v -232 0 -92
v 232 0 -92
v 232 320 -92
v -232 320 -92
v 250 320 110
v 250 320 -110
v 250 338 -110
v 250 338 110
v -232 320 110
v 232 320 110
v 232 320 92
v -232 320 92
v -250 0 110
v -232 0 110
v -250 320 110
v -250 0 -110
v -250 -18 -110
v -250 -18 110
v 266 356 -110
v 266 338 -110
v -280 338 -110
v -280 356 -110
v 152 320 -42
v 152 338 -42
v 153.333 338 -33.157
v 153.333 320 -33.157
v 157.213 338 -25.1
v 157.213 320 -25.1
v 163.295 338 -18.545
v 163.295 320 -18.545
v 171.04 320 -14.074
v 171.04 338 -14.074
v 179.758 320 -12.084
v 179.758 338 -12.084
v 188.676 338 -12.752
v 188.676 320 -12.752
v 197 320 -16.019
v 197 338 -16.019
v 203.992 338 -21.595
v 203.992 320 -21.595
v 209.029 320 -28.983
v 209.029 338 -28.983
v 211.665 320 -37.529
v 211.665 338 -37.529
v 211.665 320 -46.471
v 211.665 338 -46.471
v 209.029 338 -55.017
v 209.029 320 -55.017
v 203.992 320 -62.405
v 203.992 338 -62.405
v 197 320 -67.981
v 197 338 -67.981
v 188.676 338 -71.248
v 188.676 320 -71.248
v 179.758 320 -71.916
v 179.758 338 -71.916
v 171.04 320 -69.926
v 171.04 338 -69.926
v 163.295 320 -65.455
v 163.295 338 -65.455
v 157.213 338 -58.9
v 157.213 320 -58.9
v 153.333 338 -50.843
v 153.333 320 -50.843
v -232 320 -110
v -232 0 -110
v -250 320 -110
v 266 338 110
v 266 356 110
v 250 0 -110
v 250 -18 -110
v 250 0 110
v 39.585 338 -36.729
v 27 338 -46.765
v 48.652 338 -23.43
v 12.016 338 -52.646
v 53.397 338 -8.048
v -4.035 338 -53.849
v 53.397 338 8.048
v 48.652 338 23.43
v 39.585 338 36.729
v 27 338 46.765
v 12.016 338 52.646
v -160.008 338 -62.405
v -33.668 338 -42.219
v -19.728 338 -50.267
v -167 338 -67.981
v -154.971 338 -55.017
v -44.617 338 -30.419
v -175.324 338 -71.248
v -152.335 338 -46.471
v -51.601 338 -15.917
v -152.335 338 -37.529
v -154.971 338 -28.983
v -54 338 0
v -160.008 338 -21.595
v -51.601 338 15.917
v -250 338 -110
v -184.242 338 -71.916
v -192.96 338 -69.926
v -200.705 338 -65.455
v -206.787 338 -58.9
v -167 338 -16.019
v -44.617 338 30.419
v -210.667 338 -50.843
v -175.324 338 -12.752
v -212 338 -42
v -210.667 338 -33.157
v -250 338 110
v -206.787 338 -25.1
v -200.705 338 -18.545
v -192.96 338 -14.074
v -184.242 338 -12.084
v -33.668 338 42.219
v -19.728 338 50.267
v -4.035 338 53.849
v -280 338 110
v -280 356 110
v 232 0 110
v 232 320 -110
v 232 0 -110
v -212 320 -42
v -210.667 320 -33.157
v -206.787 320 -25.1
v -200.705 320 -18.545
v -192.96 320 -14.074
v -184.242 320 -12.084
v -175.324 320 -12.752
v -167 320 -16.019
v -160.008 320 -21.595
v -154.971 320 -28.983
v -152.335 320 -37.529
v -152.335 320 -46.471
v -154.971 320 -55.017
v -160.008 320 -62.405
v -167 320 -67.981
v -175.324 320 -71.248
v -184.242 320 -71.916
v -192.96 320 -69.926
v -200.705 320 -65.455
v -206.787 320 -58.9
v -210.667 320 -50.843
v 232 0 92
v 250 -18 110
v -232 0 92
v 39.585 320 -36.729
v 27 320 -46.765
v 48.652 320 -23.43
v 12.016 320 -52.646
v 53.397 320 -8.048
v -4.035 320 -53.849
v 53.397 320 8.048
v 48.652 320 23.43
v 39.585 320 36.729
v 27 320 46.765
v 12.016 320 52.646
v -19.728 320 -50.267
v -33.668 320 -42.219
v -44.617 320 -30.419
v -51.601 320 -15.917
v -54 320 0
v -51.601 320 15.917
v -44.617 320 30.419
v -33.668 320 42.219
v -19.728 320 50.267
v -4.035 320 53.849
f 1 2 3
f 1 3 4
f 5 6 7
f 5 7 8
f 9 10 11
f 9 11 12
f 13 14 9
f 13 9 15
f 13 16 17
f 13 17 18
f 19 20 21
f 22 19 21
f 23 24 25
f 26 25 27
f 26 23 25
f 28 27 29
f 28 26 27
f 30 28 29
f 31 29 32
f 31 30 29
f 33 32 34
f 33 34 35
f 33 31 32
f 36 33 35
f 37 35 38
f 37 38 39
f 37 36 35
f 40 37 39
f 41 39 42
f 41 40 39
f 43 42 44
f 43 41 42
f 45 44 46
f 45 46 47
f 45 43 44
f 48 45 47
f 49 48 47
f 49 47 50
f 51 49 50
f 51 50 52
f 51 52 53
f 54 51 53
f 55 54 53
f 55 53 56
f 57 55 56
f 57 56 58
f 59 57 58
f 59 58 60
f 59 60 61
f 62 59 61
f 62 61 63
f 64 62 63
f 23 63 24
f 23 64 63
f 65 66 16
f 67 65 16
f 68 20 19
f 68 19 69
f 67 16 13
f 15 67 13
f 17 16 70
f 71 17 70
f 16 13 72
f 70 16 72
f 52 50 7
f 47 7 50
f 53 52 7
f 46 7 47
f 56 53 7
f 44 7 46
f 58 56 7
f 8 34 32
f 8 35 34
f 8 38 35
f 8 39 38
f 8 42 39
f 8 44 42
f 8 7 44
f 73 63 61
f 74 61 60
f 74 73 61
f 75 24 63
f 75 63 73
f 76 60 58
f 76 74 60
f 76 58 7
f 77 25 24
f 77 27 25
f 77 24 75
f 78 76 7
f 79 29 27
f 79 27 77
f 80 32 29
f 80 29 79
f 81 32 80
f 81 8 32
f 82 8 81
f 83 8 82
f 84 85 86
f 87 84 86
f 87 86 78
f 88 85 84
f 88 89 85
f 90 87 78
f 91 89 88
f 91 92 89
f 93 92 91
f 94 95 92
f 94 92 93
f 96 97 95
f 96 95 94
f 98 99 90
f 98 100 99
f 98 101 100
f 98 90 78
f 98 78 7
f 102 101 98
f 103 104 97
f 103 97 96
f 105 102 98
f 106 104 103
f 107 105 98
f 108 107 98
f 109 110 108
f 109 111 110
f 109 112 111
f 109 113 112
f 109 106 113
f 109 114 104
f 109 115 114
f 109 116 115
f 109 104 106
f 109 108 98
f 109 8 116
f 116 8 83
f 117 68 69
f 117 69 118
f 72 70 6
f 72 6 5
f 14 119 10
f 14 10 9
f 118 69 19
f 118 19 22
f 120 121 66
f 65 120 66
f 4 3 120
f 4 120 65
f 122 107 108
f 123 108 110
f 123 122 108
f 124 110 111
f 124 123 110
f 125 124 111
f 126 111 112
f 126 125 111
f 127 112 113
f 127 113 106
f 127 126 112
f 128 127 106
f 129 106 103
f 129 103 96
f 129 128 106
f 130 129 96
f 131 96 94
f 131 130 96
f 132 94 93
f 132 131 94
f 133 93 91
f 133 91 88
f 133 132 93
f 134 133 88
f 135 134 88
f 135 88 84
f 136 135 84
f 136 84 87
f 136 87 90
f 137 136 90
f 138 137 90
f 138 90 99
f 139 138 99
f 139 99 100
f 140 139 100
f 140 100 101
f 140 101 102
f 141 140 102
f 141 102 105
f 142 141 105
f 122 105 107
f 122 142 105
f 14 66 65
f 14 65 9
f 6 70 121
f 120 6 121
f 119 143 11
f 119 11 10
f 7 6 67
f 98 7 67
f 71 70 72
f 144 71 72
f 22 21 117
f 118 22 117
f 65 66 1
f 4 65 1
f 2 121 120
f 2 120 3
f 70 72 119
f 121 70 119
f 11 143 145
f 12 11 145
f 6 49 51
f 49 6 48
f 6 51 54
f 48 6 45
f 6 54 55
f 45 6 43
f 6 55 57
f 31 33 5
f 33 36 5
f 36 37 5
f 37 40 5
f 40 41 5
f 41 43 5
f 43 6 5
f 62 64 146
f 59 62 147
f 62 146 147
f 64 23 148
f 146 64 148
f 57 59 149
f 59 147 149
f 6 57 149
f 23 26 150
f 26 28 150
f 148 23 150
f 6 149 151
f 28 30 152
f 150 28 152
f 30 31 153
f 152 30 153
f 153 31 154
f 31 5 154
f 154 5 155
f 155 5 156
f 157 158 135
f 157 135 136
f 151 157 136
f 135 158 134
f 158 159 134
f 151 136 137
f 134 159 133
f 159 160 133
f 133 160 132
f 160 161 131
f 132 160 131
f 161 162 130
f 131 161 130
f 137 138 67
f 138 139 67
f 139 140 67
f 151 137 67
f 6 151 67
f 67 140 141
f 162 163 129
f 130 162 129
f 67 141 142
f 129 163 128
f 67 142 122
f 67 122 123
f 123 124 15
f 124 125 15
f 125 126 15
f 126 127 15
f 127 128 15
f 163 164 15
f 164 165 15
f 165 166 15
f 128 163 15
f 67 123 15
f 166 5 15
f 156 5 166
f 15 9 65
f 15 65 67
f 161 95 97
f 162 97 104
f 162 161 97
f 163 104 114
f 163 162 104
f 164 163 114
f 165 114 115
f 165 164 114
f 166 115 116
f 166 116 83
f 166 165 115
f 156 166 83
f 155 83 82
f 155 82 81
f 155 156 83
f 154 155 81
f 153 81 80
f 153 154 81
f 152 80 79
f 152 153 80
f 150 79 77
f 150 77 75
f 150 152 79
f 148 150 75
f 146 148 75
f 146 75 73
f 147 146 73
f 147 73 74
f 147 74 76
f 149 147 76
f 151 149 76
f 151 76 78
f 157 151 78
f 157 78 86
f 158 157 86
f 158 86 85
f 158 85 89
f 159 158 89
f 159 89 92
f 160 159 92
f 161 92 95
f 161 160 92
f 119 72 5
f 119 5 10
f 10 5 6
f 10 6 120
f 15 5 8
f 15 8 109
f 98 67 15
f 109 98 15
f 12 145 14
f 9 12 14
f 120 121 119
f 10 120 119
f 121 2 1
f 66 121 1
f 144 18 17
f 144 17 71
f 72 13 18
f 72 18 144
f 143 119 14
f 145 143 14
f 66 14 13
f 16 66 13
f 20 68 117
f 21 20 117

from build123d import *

# Parameters (mm, degrees)
F0_W      = 500
F0_H      = 220
F1_DEPTH  = 18
F2_W      = 18
F2_H      = 220
F3_DEPTH  = 320
F4_W      = 18
F4_H      = 220
F5_DEPTH  = 320
F6_W      = 464
F6_H      = 18
F8_DEPTH  = 320
F7_W      = 464
F7_H      = 18
F9_DEPTH  = 320
F10_W     = 500
F10_H     = 220
F10_R     = 30
F10_R_2   = 54
F11_DEPTH = 18
F14_W     = 546
F14_H     = 220
F15_DEPTH = 18


with BuildPart() as f1:
    # F0 (on Front) → F1 (new body)
    with BuildSketch(Plane.XZ):
        Rectangle(F0_W, F0_H)
    extrude(amount=F1_DEPTH)


with BuildPart() as f3:
    # F2 (on face) → F3 (new body)
    with BuildSketch(Plane(origin=(0, 0, 0), x_dir=(-1, 0, 0), z_dir=(0, 1, 0))):
        with Locations((-241, 0)):
            Rectangle(F2_W, F2_H)
    extrude(amount=F3_DEPTH)


with BuildPart() as f5:
    # F4 (on face) → F5 (new body)
    with BuildSketch(Plane(origin=(0, 0, 0), x_dir=(-1, 0, 0), z_dir=(0, 1, 0))):
        with Locations((241, 0)):
            Rectangle(F4_W, F4_H)
    extrude(amount=F5_DEPTH)


with BuildPart() as f8:
    # F6 (on face) → F8 (new body)
    with BuildSketch(Plane(origin=(0, 0, 0), x_dir=(-1, 0, 0), z_dir=(0, 1, 0))):
        with Locations((0, 101)):
            Rectangle(F6_W, F6_H)
    extrude(amount=F8_DEPTH)


with BuildPart() as f9:
    # F7 (on face) → F9 (new body)
    with BuildSketch(Plane(origin=(0, 0, 0), x_dir=(-1, 0, 0), z_dir=(0, 1, 0))):
        with Locations((0, -101)):
            Rectangle(F7_W, F7_H)
    extrude(amount=F9_DEPTH)


with BuildPart() as f11:
    # F10 (on face) → F11 (new body)
    with BuildSketch(Plane(origin=(0, 320, 0), x_dir=(-1, 0, 0), z_dir=(0, 1, 0))):
        Rectangle(F10_W, F10_H)
        with Locations((-182, -42)):
            Circle(F10_R, mode=Mode.SUBTRACT)
        with Locations((182, -42)):
            Circle(F10_R, mode=Mode.SUBTRACT)
        Circle(F10_R_2, mode=Mode.SUBTRACT)
    extrude(amount=F11_DEPTH)


with BuildPart() as f12_1:
    # F12: copy of F11
    add(f11.part.moved(Location((0, 18, 0))))


with BuildPart() as f15:
    # F14 (on face) → F15 (new body)
    with BuildSketch(Plane(origin=(0, 338, 0), x_dir=(-1, 0, 0), z_dir=(0, 1, 0))):
        with Locations((7, 0)):
            Rectangle(F14_W, F14_H)
    extrude(amount=F15_DEPTH)


solid = Compound([f1.part, f3.part, f5.part, f8.part, f9.part, f11.part, f15.part])
